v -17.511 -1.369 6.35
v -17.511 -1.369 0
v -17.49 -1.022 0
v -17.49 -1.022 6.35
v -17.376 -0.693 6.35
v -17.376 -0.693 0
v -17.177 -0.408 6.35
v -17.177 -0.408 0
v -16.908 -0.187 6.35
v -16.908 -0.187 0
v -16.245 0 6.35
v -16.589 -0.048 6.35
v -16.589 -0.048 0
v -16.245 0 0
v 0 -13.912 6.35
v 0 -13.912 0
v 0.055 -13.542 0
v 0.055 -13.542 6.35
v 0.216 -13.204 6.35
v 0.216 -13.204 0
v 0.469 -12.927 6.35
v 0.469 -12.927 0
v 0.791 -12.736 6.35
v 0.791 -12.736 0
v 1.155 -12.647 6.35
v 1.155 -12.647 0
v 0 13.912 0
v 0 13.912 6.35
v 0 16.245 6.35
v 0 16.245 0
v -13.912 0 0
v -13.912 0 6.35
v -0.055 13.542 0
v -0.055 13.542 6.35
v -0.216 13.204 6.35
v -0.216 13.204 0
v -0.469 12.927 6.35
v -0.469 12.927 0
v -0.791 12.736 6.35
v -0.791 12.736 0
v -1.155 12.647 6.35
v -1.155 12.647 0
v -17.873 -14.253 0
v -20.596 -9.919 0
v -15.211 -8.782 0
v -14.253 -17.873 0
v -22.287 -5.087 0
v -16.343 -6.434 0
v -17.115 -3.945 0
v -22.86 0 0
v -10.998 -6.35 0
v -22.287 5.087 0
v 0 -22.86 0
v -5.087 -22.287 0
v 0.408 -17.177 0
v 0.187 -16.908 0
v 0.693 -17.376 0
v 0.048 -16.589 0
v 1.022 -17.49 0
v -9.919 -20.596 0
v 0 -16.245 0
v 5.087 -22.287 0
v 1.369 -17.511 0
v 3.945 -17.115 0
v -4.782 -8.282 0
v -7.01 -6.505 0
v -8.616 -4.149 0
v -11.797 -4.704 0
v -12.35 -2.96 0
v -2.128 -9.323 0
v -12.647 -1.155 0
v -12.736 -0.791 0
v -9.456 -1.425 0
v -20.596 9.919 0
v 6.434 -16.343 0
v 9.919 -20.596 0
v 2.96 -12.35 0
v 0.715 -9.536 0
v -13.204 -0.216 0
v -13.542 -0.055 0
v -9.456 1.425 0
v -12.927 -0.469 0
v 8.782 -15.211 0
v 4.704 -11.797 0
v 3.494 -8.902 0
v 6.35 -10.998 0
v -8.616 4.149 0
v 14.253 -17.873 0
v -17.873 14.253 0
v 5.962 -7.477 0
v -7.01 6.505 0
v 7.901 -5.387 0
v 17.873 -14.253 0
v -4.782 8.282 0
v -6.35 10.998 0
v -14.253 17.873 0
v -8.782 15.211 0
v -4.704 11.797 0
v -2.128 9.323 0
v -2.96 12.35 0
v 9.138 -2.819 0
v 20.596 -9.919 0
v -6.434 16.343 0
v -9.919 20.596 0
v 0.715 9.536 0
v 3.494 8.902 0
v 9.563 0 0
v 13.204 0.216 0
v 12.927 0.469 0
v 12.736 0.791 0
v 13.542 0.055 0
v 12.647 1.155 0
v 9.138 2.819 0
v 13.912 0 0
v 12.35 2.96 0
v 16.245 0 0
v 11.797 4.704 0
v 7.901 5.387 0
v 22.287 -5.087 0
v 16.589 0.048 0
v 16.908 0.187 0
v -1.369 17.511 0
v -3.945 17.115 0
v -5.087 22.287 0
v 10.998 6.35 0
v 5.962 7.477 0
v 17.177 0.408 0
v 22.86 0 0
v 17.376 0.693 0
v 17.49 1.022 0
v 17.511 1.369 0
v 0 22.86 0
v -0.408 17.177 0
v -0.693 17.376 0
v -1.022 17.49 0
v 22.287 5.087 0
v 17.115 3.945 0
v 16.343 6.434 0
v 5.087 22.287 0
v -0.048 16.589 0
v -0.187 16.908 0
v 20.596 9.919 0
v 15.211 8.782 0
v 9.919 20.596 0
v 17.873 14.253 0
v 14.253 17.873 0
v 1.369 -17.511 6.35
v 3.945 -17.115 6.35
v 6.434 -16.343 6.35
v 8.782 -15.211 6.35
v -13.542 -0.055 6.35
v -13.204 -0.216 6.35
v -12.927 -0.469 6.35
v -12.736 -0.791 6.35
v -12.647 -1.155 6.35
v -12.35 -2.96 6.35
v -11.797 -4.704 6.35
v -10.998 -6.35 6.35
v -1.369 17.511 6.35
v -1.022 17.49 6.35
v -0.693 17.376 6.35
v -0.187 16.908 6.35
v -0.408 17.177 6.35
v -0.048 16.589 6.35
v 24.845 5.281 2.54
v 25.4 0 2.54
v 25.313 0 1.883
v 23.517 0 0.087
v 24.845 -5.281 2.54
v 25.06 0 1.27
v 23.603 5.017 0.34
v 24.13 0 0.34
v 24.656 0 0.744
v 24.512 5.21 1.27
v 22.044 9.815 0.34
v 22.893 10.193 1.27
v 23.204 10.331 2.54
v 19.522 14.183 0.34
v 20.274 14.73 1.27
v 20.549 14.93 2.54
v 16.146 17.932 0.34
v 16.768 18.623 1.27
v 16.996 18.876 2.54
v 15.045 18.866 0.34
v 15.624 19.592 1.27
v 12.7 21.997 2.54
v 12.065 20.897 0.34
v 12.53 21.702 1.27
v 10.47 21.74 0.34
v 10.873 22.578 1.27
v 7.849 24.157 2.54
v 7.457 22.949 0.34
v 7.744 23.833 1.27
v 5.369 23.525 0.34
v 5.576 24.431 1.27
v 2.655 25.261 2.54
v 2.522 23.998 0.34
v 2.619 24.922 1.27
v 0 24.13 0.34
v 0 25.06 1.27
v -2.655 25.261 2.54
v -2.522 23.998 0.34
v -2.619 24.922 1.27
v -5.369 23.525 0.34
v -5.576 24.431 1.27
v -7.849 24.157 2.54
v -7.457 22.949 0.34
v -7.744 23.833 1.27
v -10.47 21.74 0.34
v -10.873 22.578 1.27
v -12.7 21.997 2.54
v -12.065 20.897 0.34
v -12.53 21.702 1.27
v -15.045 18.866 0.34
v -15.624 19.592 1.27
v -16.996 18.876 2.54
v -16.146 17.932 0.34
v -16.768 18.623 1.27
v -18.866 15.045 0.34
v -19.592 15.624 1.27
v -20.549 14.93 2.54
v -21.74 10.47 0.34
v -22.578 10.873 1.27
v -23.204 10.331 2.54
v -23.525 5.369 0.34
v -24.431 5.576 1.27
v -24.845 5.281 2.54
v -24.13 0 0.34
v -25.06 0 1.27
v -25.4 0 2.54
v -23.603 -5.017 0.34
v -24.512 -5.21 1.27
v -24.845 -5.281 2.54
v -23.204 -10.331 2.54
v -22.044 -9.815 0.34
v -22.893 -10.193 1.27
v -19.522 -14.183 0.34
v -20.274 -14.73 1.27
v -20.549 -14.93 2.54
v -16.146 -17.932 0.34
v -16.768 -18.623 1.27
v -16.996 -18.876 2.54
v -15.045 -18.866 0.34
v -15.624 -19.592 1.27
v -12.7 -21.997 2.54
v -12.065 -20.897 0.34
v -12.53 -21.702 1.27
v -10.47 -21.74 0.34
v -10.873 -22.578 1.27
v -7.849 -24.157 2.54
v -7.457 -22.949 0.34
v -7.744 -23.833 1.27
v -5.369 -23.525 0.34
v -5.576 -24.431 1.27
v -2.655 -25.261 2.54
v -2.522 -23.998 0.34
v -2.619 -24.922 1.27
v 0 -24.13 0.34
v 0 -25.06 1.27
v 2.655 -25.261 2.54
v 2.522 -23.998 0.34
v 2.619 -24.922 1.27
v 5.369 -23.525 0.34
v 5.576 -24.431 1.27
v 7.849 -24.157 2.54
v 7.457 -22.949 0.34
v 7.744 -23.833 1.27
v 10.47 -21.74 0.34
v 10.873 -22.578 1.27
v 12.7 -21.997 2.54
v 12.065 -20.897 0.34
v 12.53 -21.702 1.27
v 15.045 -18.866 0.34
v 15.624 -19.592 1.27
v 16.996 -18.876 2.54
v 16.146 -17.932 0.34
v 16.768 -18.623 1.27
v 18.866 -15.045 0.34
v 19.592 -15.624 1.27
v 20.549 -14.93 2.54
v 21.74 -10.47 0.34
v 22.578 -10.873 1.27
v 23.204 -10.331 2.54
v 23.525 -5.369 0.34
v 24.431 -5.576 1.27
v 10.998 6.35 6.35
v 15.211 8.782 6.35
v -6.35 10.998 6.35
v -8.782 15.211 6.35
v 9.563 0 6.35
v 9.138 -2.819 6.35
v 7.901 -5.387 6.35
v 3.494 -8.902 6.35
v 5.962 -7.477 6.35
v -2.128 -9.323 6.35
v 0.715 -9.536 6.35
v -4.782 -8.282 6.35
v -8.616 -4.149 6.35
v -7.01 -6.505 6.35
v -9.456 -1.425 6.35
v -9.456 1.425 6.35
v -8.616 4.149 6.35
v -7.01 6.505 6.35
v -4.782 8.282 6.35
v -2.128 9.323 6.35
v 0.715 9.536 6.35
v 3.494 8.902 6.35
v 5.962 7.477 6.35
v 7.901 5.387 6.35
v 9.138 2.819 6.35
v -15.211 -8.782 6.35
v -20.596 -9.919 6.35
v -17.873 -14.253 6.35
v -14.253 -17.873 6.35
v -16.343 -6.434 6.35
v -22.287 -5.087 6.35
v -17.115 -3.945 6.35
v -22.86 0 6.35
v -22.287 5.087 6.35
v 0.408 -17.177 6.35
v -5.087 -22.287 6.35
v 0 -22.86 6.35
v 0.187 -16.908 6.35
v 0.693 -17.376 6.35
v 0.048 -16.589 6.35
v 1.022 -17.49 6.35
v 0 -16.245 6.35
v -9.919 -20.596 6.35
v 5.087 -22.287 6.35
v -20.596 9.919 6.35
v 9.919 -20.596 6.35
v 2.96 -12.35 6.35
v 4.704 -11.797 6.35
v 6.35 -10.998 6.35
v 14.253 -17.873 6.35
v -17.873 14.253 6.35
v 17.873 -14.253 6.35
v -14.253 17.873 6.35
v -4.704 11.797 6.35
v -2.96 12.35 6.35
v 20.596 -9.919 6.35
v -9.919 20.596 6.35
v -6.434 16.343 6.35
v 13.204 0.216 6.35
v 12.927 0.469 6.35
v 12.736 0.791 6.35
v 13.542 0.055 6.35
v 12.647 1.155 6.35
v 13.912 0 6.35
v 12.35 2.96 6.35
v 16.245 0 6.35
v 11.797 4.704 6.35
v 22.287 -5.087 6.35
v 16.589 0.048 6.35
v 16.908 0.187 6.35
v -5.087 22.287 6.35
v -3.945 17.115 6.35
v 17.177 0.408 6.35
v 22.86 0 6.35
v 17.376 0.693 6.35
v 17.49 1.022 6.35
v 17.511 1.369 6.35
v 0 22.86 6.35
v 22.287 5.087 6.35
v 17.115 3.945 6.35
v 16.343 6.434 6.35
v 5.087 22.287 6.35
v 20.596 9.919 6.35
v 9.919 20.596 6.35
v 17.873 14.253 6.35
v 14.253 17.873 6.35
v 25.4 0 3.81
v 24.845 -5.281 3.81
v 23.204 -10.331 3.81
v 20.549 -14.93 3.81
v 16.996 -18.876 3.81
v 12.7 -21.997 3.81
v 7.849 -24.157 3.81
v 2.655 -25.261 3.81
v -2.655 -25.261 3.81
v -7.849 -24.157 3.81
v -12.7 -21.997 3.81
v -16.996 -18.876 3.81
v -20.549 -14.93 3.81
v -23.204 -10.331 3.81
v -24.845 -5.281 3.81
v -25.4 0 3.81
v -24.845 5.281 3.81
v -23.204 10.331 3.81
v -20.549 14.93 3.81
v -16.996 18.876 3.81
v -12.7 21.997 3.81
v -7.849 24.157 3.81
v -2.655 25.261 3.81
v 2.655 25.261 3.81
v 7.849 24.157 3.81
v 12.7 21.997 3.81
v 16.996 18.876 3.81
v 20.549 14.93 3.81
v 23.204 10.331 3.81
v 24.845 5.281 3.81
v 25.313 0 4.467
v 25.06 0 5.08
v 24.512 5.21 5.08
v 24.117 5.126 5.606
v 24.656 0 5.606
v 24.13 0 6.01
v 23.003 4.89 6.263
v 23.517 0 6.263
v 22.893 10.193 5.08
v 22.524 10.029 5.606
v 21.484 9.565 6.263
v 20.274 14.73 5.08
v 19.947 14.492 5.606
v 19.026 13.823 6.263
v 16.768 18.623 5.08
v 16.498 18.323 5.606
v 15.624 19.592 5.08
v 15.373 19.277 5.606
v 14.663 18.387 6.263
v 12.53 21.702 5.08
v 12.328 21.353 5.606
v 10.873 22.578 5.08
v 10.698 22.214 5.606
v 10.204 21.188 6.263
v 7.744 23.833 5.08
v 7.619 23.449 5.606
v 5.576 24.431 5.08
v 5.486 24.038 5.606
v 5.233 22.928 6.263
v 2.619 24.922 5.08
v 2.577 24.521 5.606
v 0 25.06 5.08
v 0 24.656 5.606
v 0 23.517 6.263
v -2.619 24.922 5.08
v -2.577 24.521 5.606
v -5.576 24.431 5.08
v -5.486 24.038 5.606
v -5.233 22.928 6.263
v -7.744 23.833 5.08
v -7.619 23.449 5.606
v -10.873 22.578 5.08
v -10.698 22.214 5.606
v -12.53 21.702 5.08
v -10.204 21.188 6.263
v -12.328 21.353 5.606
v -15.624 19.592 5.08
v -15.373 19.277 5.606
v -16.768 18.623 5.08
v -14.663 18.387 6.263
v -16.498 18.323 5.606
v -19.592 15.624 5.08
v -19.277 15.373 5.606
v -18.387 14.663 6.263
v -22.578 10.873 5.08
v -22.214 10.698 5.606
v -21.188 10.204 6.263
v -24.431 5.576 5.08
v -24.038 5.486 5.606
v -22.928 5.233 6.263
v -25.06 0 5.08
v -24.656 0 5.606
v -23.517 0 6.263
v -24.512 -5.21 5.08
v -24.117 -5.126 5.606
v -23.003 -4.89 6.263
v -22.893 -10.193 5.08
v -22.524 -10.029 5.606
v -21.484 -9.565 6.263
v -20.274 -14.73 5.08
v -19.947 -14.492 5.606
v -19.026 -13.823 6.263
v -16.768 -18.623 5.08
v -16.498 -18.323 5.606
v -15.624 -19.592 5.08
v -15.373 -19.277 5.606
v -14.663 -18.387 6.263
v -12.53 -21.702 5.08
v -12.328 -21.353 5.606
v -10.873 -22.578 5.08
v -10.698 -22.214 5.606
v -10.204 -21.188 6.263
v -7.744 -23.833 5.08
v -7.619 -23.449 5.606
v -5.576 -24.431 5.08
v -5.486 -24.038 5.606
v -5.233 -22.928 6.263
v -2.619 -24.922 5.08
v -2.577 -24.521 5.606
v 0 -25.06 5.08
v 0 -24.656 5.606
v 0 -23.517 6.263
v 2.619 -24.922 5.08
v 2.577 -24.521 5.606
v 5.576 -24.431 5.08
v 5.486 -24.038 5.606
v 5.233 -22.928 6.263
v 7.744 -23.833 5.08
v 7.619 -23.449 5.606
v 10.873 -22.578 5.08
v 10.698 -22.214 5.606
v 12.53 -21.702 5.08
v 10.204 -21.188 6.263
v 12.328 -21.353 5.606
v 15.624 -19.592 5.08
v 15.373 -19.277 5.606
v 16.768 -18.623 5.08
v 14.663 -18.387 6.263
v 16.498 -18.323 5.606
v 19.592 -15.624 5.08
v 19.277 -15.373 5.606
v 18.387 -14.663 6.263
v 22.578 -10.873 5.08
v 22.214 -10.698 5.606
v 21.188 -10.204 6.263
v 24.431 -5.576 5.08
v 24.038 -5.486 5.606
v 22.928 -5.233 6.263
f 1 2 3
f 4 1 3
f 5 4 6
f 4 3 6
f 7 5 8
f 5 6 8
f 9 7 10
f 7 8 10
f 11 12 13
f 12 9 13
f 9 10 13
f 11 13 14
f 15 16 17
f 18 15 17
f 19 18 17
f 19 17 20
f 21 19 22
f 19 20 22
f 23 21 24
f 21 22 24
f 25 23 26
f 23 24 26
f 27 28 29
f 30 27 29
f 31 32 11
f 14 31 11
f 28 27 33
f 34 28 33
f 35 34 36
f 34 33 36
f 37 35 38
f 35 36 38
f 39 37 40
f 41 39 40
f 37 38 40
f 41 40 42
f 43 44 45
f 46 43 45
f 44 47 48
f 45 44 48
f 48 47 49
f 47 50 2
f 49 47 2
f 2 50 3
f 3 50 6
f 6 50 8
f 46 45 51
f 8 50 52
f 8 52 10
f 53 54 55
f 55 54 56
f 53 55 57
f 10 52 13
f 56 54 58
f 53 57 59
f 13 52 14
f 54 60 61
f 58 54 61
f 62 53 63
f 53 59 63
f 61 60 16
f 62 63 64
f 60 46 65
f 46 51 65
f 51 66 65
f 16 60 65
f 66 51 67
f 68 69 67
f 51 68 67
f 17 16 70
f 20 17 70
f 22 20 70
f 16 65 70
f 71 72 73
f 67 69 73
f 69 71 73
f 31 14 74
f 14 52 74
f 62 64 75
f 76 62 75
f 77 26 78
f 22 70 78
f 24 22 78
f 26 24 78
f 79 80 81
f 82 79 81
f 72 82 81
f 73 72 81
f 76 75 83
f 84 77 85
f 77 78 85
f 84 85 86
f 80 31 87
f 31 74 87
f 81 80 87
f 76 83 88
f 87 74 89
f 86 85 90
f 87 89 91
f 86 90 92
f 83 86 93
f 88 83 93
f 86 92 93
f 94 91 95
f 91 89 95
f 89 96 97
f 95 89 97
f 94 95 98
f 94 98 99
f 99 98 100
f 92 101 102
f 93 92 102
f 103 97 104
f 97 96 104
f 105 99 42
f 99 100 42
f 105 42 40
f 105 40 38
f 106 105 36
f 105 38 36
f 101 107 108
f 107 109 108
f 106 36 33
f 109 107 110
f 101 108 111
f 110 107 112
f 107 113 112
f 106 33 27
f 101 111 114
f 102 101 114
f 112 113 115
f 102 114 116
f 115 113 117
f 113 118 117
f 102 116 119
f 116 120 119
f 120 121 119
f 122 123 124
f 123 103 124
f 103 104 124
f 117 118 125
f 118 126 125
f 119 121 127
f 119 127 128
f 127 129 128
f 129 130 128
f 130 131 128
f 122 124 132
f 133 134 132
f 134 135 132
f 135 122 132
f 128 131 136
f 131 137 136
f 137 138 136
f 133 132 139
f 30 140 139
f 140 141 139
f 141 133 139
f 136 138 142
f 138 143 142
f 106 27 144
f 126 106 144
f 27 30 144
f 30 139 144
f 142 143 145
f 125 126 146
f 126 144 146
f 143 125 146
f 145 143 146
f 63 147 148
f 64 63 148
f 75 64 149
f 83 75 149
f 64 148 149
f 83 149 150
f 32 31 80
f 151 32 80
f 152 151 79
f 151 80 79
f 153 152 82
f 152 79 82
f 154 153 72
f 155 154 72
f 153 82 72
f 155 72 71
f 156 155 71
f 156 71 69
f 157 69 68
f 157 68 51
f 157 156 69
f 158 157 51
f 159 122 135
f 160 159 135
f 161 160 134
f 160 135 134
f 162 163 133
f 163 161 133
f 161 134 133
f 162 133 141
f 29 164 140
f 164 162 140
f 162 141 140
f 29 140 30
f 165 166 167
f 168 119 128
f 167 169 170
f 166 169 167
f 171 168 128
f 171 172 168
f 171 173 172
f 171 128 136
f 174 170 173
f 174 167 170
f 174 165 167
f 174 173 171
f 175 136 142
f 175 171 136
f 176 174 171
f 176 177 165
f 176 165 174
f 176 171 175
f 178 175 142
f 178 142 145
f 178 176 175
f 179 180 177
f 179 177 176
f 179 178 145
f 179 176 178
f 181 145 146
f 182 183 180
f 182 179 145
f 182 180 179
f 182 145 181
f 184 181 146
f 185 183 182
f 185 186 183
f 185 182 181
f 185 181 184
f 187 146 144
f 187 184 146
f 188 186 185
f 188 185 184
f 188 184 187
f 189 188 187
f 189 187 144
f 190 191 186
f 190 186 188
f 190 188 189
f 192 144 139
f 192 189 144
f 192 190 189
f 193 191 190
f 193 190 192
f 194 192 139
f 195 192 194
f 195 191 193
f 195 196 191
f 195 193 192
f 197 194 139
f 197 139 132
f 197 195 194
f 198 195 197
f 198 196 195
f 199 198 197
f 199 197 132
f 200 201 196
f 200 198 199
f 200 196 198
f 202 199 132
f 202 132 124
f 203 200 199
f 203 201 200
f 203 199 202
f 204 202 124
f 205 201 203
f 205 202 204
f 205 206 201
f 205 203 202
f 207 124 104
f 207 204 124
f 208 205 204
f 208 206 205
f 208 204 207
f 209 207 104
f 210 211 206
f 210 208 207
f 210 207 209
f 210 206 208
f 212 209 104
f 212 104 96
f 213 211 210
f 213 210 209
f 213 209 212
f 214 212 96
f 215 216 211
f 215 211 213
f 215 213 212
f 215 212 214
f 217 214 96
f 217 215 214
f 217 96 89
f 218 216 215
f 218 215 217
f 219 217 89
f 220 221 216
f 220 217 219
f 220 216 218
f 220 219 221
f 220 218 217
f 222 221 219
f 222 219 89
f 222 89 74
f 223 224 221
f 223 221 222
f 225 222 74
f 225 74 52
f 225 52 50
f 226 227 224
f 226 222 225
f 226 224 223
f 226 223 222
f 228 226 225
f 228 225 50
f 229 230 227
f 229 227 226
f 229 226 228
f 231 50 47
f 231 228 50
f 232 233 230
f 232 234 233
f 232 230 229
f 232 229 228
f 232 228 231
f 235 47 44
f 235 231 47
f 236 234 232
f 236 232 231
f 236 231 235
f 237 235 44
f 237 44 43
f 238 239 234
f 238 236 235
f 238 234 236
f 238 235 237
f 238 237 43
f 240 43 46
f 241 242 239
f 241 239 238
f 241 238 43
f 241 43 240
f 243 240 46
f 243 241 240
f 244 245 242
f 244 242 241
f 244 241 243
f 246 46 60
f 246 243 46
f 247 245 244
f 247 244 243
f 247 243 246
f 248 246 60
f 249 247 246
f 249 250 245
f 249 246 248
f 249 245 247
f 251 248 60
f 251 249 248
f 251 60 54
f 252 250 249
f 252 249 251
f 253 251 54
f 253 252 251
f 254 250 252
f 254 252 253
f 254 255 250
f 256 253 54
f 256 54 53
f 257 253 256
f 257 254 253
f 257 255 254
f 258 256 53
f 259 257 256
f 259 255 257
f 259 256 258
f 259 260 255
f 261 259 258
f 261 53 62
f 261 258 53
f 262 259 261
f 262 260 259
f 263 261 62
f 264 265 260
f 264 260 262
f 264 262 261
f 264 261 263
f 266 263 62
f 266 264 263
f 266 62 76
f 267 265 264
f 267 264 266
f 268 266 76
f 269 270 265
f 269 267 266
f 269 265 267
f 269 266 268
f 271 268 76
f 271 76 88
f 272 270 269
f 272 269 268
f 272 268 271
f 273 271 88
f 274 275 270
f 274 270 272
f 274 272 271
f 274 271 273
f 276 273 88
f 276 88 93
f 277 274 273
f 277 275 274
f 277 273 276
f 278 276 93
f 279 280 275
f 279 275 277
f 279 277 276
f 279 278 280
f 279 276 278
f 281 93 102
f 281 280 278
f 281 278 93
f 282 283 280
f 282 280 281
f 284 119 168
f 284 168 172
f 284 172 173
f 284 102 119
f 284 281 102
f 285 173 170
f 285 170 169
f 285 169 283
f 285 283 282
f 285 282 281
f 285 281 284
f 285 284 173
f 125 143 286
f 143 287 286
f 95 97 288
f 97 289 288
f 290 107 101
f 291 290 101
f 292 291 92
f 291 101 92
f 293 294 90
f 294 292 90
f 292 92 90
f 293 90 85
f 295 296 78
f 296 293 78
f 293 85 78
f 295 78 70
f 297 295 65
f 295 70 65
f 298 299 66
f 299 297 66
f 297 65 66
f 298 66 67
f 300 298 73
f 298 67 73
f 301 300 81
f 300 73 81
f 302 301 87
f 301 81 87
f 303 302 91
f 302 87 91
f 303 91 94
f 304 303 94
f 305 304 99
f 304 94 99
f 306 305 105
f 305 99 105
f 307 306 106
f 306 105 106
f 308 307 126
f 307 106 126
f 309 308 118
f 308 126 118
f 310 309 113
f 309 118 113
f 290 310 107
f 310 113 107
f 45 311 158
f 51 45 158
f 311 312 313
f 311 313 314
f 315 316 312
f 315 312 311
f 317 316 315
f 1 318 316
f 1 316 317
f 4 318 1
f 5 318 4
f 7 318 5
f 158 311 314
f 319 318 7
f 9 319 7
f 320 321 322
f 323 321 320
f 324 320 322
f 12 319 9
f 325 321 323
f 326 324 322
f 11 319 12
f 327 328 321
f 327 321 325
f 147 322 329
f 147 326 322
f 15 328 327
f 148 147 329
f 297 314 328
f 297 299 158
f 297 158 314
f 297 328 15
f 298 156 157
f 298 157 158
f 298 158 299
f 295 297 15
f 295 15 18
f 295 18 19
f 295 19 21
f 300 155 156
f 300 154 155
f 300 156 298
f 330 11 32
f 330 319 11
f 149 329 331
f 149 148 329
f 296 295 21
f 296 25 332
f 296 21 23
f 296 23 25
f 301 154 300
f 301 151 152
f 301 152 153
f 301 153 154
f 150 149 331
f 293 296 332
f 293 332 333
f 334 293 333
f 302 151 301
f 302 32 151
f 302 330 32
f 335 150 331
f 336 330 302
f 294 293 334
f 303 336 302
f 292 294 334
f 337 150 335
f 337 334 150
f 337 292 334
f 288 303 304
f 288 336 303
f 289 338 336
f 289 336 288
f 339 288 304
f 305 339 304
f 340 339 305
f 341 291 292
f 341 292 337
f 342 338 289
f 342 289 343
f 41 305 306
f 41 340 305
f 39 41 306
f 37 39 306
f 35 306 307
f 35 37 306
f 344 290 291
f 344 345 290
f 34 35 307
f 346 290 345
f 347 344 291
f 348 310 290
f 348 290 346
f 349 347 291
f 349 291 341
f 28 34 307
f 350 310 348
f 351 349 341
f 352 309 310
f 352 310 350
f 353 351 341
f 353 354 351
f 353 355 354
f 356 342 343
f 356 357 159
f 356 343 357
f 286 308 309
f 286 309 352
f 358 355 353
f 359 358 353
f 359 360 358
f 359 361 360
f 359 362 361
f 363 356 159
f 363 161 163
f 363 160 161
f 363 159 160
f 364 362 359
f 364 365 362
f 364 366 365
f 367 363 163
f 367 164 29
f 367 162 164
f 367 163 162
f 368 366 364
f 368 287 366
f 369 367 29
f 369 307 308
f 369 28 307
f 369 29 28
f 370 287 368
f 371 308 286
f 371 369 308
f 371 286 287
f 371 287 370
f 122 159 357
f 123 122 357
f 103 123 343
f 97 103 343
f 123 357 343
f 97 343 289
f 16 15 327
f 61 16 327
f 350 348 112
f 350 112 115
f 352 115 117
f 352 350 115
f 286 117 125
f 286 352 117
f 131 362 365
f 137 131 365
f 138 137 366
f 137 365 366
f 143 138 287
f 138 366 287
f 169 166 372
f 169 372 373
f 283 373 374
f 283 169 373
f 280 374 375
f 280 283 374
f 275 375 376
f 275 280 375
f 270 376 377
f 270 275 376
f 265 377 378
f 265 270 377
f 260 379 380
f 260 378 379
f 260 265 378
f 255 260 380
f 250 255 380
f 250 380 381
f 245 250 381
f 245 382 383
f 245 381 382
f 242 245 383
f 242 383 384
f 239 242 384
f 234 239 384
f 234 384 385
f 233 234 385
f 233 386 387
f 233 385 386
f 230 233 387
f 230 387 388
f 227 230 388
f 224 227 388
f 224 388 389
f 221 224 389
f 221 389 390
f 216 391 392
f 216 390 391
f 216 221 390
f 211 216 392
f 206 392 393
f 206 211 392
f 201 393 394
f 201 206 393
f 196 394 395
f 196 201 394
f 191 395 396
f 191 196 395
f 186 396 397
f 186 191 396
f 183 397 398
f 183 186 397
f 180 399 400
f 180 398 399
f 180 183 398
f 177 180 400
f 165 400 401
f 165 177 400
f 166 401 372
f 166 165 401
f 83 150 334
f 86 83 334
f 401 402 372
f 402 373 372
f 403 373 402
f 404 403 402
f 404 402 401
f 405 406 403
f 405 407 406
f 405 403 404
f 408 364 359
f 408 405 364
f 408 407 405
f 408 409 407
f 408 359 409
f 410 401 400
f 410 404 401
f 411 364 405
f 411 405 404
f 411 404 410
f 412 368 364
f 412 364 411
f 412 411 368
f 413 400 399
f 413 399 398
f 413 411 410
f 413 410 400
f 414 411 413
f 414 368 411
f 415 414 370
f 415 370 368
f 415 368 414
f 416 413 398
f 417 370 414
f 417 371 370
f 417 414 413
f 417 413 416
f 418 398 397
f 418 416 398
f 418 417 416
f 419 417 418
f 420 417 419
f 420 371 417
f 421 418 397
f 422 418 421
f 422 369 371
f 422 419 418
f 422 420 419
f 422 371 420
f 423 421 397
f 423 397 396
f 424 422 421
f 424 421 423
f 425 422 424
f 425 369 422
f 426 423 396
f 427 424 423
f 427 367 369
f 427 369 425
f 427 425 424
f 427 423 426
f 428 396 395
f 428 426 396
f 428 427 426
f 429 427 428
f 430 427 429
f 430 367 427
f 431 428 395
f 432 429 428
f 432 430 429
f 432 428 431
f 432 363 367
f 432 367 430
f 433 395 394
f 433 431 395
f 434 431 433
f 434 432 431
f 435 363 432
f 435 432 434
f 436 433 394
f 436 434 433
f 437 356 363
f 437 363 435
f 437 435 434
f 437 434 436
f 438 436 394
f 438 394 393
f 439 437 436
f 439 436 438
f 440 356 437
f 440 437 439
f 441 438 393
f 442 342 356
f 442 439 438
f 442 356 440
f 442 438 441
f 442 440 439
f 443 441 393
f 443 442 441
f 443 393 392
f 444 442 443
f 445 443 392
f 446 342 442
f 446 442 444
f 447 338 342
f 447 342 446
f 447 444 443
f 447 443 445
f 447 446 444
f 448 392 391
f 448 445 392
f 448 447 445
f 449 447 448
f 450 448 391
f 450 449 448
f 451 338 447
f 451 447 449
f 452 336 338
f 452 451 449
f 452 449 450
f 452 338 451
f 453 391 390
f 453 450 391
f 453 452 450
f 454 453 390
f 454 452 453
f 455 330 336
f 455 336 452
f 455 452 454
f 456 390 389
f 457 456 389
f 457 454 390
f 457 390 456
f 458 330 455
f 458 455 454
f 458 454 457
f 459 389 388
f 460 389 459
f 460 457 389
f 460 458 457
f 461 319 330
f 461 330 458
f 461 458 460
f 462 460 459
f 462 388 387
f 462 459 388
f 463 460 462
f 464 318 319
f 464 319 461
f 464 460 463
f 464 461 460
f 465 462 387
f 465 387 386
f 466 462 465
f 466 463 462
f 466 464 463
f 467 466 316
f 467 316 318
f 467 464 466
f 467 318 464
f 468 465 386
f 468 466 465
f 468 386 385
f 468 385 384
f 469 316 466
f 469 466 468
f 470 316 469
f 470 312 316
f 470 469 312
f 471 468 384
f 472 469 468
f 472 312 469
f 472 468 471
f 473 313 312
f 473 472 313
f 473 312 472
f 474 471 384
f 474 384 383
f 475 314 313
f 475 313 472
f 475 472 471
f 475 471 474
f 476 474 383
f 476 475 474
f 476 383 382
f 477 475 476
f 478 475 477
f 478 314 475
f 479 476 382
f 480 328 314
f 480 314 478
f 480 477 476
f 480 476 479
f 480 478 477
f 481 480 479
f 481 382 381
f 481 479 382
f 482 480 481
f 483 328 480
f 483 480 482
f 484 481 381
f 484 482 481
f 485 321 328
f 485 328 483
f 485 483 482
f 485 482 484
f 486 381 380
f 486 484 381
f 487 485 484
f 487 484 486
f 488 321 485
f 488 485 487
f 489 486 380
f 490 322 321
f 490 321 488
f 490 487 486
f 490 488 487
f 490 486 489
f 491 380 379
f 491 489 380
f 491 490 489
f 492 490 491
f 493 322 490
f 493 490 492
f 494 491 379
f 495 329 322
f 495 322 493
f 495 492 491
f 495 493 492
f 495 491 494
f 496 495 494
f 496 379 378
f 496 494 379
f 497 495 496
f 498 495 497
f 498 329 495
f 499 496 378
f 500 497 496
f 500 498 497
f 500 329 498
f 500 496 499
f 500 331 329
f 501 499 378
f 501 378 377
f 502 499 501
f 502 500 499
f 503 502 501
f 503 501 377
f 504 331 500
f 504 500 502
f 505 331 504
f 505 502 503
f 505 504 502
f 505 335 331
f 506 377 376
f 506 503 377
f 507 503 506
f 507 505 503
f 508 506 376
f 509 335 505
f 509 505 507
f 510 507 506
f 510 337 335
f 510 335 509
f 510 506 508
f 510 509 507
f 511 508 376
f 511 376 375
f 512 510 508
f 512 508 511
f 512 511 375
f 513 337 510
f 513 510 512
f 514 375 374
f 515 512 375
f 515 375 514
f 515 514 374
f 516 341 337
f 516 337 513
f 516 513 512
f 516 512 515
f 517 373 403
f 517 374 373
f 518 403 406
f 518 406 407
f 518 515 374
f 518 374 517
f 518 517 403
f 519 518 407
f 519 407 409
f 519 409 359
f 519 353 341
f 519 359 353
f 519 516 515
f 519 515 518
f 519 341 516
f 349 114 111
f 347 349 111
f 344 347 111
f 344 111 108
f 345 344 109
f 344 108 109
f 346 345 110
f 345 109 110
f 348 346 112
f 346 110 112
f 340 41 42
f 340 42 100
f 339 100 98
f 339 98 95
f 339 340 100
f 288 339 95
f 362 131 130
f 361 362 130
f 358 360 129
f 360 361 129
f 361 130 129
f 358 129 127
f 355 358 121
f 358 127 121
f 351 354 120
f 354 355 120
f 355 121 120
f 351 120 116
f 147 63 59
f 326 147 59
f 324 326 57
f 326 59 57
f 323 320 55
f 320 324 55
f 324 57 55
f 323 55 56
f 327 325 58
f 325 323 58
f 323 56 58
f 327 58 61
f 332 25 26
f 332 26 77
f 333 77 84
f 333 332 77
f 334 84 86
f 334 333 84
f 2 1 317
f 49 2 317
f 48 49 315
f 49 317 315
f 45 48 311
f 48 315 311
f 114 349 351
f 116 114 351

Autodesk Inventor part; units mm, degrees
ref_plane "YZ Plane" through (0, 0, 0) normal (1, 0, 0) x (0, 1, 0)
ref_plane "XZ Plane" through (0, 0, 0) normal (0, 1, 0) x (-1, 0, 0)
ref_plane "XY Plane" through (0, 0, 0) normal (0, 0, 1) x (1, 0, 0)
sketch "Sketch1" plane through (0, 0, 0) normal (0, 0, 1) x (1, 0, 0)
  circle A0 centre (0, 0) radius 25.4
  circle A1 centre (0, 0) radius 9.5631
  dimension "d0" = 50.8
  dimension "d4" = 19.1262
extrude "Extrusion1" add sketch "Sketch1" along normal blind 6.35
sketch "Sketch2" plane through (0, 0, 6.35) normal (0, 0, 1) x (1, 0, 0)
  circle A0 centre (0, 0) radius 17.5641 construction
  line L0 (0, 17.5641) -> (0, 0) construction
  line L1 (0, 0) -> (-8.782, 15.211) construction
  line L2 (0, 0) -> (0, -17.5641) construction
  line L3 (0, 0) -> (8.7821, -15.211) construction
  circle A1 centre (0, 0) radius 12.7 construction
  arc A2 (0, 12.7) -> (-6.35, 10.9985) centre (0, 0) ccw
  arc A3 (0, 17.5641) -> (-8.782, 15.211) centre (0, 0) ccw
  line L4 (-8.782, 15.211) -> (-6.35, 10.9985)
  line L5 (0, 12.7) -> (0, 17.5641)
  dimension "d5" = 35.1282
  dimension "d6" = 30
  dimension "d7" = 25.4
extrude "Extrusion3" cut sketch "Sketch2" against normal up to surface (6.35 mm away)
pattern_circular "Circular Pattern2" count 4 over 360 about axis through (0, 0, 0) along (0, 0, 1) of "Extrusion3"
fillet "Fillet1" radius 1.27 8 edges at (0, 17.5641, 3.175) (0, 12.7, 3.175) (17.5641, 0, 3.175) (12.7, 0, 3.175) (0, -17.5641, 3.175) (0, -12.7, 3.175) (-17.5641, 0, 3.175) (-12.7, 0, 3.175)
fillet "Fillet2" radius 2.54 2 edges at (-25.4, 0, 0) (-25.4, 0, 6.35)
properties part number "Spool Cap Section Mk1"
